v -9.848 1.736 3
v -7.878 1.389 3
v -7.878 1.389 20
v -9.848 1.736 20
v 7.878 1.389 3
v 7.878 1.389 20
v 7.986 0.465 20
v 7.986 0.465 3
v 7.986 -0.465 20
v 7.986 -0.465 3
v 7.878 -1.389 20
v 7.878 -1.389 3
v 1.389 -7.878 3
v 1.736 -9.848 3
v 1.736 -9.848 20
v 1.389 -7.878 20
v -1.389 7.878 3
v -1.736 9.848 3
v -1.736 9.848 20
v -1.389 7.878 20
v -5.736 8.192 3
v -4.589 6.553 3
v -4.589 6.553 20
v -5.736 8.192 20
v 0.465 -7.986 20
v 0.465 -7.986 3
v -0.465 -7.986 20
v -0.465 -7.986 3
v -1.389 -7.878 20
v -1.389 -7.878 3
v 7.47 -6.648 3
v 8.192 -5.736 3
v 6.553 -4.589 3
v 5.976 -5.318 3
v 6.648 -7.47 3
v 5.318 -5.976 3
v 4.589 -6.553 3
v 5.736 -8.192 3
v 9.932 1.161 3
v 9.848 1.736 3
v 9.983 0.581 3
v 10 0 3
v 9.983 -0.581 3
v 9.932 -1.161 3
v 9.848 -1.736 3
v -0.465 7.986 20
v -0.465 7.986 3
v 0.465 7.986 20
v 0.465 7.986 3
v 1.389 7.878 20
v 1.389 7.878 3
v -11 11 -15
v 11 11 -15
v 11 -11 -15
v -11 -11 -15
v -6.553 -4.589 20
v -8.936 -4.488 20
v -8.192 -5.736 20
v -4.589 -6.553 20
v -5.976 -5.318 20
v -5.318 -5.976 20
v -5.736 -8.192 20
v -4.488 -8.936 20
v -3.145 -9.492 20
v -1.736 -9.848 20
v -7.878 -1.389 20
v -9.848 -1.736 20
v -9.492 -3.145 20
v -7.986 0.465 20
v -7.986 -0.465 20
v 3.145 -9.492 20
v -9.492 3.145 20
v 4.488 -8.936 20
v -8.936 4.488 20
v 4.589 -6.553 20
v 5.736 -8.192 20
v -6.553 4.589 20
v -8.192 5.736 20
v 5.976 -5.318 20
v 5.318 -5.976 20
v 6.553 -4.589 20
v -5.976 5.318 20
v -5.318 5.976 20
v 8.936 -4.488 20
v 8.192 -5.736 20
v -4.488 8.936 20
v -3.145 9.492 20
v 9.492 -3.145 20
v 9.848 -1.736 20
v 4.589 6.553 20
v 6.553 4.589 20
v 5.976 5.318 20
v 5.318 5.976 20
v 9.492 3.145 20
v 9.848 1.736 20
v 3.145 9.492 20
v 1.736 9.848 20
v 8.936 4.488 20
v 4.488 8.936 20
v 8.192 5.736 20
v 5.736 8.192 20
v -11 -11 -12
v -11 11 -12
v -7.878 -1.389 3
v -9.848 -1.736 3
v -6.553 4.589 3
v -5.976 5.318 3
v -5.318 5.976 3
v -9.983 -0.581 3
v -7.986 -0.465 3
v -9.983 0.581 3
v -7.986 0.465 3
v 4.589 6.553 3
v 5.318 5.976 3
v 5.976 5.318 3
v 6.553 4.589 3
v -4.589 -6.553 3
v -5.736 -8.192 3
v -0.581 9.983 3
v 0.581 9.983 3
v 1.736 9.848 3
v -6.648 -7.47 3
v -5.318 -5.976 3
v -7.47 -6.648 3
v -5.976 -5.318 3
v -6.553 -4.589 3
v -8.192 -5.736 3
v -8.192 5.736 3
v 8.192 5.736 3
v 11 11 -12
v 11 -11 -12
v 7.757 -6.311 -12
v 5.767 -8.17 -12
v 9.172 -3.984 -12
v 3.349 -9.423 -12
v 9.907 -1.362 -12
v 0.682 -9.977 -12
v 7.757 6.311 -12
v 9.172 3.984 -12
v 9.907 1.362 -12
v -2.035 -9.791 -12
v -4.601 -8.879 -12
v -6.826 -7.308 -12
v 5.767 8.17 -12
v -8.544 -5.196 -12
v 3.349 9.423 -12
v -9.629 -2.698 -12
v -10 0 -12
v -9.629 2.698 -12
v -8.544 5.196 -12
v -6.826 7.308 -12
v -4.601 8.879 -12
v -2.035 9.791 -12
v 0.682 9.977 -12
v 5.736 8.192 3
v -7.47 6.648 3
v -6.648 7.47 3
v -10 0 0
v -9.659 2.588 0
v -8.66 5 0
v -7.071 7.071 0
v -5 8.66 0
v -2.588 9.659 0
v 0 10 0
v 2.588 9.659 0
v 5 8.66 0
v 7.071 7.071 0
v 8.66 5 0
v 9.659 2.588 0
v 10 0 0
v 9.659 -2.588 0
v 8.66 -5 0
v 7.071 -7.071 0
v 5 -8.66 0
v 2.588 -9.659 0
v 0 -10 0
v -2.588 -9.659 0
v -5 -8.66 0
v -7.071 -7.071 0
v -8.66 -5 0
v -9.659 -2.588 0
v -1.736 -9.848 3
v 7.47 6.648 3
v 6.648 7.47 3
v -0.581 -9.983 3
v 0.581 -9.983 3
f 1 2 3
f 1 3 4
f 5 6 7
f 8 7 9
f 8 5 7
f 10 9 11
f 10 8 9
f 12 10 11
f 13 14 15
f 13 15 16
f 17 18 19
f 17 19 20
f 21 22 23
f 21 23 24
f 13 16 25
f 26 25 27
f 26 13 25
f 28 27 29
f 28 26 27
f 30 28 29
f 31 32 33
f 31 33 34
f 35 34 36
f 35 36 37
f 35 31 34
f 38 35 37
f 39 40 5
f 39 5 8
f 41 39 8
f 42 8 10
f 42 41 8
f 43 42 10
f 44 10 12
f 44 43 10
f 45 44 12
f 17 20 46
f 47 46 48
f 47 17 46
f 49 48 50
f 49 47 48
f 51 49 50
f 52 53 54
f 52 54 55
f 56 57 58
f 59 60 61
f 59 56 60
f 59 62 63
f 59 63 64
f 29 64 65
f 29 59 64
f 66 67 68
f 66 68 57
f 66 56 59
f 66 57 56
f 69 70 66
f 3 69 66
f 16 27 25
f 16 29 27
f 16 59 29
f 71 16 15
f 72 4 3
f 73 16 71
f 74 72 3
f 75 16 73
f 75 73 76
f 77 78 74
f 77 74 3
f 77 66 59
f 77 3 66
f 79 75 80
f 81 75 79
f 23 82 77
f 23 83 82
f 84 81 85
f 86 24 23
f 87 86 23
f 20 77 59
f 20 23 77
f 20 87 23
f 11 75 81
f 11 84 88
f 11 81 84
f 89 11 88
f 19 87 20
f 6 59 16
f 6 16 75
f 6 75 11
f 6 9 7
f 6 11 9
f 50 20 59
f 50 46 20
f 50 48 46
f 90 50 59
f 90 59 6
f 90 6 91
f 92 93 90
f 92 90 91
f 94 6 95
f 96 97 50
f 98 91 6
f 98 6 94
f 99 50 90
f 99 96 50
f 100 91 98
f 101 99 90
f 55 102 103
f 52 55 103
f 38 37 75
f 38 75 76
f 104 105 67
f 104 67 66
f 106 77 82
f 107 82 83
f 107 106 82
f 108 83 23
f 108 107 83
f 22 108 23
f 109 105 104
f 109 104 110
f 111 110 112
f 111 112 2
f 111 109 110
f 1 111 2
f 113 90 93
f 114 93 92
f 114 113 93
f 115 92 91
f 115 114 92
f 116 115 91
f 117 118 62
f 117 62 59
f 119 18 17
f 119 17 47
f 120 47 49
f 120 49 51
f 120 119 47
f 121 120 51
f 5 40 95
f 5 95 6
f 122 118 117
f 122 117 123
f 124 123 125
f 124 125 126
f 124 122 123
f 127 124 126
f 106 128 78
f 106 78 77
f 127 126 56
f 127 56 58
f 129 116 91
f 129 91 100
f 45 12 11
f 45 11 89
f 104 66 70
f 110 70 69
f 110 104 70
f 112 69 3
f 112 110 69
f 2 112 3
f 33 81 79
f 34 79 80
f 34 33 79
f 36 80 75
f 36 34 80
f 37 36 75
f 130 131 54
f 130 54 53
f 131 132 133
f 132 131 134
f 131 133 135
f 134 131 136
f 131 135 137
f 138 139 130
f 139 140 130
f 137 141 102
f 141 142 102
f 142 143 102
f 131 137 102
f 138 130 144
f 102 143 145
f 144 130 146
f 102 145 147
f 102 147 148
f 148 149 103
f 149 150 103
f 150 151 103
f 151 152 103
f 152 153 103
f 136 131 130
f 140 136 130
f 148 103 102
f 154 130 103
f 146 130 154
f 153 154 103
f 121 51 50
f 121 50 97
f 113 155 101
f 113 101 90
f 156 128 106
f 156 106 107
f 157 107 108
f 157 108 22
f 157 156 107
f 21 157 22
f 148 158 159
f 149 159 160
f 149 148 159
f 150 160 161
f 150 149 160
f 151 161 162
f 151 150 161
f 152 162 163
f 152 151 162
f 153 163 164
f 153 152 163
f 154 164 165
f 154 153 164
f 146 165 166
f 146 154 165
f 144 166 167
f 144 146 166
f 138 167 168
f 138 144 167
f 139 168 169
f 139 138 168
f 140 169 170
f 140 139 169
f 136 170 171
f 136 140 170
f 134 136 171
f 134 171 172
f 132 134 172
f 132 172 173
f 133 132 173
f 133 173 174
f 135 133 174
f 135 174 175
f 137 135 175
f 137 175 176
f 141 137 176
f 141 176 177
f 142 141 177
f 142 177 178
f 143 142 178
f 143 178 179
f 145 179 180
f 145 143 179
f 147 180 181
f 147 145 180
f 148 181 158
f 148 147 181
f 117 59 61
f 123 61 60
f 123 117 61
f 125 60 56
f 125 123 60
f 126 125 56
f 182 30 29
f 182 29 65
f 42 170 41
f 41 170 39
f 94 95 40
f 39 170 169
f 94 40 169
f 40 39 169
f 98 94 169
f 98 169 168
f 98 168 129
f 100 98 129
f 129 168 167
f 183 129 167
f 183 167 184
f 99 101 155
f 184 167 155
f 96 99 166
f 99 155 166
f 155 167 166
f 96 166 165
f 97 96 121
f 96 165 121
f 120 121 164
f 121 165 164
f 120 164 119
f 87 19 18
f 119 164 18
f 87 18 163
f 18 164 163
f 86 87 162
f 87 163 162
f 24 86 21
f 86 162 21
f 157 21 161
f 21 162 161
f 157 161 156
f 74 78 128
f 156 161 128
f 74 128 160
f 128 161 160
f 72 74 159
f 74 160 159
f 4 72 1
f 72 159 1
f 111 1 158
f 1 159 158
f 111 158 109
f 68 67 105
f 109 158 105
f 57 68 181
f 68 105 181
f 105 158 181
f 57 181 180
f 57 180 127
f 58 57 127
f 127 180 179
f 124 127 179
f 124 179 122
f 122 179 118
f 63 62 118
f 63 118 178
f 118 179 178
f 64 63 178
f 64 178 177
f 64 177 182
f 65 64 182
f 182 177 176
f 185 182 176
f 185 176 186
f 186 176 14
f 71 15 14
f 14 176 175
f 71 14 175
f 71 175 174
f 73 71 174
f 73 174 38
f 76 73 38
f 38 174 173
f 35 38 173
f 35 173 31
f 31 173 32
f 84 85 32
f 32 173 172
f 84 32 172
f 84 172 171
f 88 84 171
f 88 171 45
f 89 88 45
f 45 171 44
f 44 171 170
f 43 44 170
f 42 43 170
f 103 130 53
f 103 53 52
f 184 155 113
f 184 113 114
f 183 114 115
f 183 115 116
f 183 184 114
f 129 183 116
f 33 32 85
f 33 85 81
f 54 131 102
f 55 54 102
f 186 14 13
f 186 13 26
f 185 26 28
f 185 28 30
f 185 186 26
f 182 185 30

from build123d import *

# Parameters (mm, degrees)
SKETCH1_R           = 10
BOSS_EXTRUDE1_DEPTH = 20
CUT_EXTRUDE1_START  = -17
CUT_EXTRUDE1_DEPTH  = 17
CIRPATTERN1_COUNT   = 8
BOSS_EXTRUDE2_START = 12
SKETCH3_R           = 10
BOSS_EXTRUDE2_DEPTH = 12
SKETCH4_W           = 22
SKETCH4_H           = 22
BOSS_EXTRUDE3_DEPTH = 3


with BuildPart() as part:
    # Sketch1 → Boss-Extrude1 (new body)
    with BuildSketch(Plane.XY):
        Circle(SKETCH1_R)
    extrude(amount=BOSS_EXTRUDE1_DEPTH)

    # Sketch2 → Cut-Extrude1 (cut)
    with BuildSketch(Plane.XY.offset(20).offset(CUT_EXTRUDE1_START)):
        with BuildLine():
            Line((-1.736481777, 9.84807753), (-1.389185421, 7.878462024))
            ThreePointArc((-1.389185421, 7.878462024), (0, 8), (1.389185421, 7.878462024))
            Line((1.389185421, 7.878462024), (1.736481777, 9.84807753))
            ThreePointArc((1.736481777, 9.84807753), (0, 10), (-1.736481777, 9.84807753))
        make_face()
    cut_extrude1 = extrude(amount=CUT_EXTRUDE1_DEPTH, mode=Mode.SUBTRACT)

    # CirPattern1: Cut-Extrude1 ×8 about axis
    cirpattern1_axis = Axis((0, 0, 0), (0, 0, 1))
    for i in range(1, CIRPATTERN1_COUNT):
        add(cut_extrude1.rotate(cirpattern1_axis, i * 360 / CIRPATTERN1_COUNT), mode=Mode.SUBTRACT)

    # Sketch3 → Boss-Extrude2 (add)
    with BuildSketch(Plane(origin=(0, 0, 0), x_dir=(-1, 0, 0), z_dir=(0, 0, -1)).offset(BOSS_EXTRUDE2_START)):
        Circle(SKETCH3_R)
    extrude(amount=-BOSS_EXTRUDE2_DEPTH)

    # Sketch4 → Boss-Extrude3 (add)
    with BuildSketch(Plane(origin=(0, 0, -12), x_dir=(-1, 0, 0), z_dir=(0, 0, -1))):
        Rectangle(SKETCH4_W, SKETCH4_H)
    extrude(amount=BOSS_EXTRUDE3_DEPTH)


solid = part.part
